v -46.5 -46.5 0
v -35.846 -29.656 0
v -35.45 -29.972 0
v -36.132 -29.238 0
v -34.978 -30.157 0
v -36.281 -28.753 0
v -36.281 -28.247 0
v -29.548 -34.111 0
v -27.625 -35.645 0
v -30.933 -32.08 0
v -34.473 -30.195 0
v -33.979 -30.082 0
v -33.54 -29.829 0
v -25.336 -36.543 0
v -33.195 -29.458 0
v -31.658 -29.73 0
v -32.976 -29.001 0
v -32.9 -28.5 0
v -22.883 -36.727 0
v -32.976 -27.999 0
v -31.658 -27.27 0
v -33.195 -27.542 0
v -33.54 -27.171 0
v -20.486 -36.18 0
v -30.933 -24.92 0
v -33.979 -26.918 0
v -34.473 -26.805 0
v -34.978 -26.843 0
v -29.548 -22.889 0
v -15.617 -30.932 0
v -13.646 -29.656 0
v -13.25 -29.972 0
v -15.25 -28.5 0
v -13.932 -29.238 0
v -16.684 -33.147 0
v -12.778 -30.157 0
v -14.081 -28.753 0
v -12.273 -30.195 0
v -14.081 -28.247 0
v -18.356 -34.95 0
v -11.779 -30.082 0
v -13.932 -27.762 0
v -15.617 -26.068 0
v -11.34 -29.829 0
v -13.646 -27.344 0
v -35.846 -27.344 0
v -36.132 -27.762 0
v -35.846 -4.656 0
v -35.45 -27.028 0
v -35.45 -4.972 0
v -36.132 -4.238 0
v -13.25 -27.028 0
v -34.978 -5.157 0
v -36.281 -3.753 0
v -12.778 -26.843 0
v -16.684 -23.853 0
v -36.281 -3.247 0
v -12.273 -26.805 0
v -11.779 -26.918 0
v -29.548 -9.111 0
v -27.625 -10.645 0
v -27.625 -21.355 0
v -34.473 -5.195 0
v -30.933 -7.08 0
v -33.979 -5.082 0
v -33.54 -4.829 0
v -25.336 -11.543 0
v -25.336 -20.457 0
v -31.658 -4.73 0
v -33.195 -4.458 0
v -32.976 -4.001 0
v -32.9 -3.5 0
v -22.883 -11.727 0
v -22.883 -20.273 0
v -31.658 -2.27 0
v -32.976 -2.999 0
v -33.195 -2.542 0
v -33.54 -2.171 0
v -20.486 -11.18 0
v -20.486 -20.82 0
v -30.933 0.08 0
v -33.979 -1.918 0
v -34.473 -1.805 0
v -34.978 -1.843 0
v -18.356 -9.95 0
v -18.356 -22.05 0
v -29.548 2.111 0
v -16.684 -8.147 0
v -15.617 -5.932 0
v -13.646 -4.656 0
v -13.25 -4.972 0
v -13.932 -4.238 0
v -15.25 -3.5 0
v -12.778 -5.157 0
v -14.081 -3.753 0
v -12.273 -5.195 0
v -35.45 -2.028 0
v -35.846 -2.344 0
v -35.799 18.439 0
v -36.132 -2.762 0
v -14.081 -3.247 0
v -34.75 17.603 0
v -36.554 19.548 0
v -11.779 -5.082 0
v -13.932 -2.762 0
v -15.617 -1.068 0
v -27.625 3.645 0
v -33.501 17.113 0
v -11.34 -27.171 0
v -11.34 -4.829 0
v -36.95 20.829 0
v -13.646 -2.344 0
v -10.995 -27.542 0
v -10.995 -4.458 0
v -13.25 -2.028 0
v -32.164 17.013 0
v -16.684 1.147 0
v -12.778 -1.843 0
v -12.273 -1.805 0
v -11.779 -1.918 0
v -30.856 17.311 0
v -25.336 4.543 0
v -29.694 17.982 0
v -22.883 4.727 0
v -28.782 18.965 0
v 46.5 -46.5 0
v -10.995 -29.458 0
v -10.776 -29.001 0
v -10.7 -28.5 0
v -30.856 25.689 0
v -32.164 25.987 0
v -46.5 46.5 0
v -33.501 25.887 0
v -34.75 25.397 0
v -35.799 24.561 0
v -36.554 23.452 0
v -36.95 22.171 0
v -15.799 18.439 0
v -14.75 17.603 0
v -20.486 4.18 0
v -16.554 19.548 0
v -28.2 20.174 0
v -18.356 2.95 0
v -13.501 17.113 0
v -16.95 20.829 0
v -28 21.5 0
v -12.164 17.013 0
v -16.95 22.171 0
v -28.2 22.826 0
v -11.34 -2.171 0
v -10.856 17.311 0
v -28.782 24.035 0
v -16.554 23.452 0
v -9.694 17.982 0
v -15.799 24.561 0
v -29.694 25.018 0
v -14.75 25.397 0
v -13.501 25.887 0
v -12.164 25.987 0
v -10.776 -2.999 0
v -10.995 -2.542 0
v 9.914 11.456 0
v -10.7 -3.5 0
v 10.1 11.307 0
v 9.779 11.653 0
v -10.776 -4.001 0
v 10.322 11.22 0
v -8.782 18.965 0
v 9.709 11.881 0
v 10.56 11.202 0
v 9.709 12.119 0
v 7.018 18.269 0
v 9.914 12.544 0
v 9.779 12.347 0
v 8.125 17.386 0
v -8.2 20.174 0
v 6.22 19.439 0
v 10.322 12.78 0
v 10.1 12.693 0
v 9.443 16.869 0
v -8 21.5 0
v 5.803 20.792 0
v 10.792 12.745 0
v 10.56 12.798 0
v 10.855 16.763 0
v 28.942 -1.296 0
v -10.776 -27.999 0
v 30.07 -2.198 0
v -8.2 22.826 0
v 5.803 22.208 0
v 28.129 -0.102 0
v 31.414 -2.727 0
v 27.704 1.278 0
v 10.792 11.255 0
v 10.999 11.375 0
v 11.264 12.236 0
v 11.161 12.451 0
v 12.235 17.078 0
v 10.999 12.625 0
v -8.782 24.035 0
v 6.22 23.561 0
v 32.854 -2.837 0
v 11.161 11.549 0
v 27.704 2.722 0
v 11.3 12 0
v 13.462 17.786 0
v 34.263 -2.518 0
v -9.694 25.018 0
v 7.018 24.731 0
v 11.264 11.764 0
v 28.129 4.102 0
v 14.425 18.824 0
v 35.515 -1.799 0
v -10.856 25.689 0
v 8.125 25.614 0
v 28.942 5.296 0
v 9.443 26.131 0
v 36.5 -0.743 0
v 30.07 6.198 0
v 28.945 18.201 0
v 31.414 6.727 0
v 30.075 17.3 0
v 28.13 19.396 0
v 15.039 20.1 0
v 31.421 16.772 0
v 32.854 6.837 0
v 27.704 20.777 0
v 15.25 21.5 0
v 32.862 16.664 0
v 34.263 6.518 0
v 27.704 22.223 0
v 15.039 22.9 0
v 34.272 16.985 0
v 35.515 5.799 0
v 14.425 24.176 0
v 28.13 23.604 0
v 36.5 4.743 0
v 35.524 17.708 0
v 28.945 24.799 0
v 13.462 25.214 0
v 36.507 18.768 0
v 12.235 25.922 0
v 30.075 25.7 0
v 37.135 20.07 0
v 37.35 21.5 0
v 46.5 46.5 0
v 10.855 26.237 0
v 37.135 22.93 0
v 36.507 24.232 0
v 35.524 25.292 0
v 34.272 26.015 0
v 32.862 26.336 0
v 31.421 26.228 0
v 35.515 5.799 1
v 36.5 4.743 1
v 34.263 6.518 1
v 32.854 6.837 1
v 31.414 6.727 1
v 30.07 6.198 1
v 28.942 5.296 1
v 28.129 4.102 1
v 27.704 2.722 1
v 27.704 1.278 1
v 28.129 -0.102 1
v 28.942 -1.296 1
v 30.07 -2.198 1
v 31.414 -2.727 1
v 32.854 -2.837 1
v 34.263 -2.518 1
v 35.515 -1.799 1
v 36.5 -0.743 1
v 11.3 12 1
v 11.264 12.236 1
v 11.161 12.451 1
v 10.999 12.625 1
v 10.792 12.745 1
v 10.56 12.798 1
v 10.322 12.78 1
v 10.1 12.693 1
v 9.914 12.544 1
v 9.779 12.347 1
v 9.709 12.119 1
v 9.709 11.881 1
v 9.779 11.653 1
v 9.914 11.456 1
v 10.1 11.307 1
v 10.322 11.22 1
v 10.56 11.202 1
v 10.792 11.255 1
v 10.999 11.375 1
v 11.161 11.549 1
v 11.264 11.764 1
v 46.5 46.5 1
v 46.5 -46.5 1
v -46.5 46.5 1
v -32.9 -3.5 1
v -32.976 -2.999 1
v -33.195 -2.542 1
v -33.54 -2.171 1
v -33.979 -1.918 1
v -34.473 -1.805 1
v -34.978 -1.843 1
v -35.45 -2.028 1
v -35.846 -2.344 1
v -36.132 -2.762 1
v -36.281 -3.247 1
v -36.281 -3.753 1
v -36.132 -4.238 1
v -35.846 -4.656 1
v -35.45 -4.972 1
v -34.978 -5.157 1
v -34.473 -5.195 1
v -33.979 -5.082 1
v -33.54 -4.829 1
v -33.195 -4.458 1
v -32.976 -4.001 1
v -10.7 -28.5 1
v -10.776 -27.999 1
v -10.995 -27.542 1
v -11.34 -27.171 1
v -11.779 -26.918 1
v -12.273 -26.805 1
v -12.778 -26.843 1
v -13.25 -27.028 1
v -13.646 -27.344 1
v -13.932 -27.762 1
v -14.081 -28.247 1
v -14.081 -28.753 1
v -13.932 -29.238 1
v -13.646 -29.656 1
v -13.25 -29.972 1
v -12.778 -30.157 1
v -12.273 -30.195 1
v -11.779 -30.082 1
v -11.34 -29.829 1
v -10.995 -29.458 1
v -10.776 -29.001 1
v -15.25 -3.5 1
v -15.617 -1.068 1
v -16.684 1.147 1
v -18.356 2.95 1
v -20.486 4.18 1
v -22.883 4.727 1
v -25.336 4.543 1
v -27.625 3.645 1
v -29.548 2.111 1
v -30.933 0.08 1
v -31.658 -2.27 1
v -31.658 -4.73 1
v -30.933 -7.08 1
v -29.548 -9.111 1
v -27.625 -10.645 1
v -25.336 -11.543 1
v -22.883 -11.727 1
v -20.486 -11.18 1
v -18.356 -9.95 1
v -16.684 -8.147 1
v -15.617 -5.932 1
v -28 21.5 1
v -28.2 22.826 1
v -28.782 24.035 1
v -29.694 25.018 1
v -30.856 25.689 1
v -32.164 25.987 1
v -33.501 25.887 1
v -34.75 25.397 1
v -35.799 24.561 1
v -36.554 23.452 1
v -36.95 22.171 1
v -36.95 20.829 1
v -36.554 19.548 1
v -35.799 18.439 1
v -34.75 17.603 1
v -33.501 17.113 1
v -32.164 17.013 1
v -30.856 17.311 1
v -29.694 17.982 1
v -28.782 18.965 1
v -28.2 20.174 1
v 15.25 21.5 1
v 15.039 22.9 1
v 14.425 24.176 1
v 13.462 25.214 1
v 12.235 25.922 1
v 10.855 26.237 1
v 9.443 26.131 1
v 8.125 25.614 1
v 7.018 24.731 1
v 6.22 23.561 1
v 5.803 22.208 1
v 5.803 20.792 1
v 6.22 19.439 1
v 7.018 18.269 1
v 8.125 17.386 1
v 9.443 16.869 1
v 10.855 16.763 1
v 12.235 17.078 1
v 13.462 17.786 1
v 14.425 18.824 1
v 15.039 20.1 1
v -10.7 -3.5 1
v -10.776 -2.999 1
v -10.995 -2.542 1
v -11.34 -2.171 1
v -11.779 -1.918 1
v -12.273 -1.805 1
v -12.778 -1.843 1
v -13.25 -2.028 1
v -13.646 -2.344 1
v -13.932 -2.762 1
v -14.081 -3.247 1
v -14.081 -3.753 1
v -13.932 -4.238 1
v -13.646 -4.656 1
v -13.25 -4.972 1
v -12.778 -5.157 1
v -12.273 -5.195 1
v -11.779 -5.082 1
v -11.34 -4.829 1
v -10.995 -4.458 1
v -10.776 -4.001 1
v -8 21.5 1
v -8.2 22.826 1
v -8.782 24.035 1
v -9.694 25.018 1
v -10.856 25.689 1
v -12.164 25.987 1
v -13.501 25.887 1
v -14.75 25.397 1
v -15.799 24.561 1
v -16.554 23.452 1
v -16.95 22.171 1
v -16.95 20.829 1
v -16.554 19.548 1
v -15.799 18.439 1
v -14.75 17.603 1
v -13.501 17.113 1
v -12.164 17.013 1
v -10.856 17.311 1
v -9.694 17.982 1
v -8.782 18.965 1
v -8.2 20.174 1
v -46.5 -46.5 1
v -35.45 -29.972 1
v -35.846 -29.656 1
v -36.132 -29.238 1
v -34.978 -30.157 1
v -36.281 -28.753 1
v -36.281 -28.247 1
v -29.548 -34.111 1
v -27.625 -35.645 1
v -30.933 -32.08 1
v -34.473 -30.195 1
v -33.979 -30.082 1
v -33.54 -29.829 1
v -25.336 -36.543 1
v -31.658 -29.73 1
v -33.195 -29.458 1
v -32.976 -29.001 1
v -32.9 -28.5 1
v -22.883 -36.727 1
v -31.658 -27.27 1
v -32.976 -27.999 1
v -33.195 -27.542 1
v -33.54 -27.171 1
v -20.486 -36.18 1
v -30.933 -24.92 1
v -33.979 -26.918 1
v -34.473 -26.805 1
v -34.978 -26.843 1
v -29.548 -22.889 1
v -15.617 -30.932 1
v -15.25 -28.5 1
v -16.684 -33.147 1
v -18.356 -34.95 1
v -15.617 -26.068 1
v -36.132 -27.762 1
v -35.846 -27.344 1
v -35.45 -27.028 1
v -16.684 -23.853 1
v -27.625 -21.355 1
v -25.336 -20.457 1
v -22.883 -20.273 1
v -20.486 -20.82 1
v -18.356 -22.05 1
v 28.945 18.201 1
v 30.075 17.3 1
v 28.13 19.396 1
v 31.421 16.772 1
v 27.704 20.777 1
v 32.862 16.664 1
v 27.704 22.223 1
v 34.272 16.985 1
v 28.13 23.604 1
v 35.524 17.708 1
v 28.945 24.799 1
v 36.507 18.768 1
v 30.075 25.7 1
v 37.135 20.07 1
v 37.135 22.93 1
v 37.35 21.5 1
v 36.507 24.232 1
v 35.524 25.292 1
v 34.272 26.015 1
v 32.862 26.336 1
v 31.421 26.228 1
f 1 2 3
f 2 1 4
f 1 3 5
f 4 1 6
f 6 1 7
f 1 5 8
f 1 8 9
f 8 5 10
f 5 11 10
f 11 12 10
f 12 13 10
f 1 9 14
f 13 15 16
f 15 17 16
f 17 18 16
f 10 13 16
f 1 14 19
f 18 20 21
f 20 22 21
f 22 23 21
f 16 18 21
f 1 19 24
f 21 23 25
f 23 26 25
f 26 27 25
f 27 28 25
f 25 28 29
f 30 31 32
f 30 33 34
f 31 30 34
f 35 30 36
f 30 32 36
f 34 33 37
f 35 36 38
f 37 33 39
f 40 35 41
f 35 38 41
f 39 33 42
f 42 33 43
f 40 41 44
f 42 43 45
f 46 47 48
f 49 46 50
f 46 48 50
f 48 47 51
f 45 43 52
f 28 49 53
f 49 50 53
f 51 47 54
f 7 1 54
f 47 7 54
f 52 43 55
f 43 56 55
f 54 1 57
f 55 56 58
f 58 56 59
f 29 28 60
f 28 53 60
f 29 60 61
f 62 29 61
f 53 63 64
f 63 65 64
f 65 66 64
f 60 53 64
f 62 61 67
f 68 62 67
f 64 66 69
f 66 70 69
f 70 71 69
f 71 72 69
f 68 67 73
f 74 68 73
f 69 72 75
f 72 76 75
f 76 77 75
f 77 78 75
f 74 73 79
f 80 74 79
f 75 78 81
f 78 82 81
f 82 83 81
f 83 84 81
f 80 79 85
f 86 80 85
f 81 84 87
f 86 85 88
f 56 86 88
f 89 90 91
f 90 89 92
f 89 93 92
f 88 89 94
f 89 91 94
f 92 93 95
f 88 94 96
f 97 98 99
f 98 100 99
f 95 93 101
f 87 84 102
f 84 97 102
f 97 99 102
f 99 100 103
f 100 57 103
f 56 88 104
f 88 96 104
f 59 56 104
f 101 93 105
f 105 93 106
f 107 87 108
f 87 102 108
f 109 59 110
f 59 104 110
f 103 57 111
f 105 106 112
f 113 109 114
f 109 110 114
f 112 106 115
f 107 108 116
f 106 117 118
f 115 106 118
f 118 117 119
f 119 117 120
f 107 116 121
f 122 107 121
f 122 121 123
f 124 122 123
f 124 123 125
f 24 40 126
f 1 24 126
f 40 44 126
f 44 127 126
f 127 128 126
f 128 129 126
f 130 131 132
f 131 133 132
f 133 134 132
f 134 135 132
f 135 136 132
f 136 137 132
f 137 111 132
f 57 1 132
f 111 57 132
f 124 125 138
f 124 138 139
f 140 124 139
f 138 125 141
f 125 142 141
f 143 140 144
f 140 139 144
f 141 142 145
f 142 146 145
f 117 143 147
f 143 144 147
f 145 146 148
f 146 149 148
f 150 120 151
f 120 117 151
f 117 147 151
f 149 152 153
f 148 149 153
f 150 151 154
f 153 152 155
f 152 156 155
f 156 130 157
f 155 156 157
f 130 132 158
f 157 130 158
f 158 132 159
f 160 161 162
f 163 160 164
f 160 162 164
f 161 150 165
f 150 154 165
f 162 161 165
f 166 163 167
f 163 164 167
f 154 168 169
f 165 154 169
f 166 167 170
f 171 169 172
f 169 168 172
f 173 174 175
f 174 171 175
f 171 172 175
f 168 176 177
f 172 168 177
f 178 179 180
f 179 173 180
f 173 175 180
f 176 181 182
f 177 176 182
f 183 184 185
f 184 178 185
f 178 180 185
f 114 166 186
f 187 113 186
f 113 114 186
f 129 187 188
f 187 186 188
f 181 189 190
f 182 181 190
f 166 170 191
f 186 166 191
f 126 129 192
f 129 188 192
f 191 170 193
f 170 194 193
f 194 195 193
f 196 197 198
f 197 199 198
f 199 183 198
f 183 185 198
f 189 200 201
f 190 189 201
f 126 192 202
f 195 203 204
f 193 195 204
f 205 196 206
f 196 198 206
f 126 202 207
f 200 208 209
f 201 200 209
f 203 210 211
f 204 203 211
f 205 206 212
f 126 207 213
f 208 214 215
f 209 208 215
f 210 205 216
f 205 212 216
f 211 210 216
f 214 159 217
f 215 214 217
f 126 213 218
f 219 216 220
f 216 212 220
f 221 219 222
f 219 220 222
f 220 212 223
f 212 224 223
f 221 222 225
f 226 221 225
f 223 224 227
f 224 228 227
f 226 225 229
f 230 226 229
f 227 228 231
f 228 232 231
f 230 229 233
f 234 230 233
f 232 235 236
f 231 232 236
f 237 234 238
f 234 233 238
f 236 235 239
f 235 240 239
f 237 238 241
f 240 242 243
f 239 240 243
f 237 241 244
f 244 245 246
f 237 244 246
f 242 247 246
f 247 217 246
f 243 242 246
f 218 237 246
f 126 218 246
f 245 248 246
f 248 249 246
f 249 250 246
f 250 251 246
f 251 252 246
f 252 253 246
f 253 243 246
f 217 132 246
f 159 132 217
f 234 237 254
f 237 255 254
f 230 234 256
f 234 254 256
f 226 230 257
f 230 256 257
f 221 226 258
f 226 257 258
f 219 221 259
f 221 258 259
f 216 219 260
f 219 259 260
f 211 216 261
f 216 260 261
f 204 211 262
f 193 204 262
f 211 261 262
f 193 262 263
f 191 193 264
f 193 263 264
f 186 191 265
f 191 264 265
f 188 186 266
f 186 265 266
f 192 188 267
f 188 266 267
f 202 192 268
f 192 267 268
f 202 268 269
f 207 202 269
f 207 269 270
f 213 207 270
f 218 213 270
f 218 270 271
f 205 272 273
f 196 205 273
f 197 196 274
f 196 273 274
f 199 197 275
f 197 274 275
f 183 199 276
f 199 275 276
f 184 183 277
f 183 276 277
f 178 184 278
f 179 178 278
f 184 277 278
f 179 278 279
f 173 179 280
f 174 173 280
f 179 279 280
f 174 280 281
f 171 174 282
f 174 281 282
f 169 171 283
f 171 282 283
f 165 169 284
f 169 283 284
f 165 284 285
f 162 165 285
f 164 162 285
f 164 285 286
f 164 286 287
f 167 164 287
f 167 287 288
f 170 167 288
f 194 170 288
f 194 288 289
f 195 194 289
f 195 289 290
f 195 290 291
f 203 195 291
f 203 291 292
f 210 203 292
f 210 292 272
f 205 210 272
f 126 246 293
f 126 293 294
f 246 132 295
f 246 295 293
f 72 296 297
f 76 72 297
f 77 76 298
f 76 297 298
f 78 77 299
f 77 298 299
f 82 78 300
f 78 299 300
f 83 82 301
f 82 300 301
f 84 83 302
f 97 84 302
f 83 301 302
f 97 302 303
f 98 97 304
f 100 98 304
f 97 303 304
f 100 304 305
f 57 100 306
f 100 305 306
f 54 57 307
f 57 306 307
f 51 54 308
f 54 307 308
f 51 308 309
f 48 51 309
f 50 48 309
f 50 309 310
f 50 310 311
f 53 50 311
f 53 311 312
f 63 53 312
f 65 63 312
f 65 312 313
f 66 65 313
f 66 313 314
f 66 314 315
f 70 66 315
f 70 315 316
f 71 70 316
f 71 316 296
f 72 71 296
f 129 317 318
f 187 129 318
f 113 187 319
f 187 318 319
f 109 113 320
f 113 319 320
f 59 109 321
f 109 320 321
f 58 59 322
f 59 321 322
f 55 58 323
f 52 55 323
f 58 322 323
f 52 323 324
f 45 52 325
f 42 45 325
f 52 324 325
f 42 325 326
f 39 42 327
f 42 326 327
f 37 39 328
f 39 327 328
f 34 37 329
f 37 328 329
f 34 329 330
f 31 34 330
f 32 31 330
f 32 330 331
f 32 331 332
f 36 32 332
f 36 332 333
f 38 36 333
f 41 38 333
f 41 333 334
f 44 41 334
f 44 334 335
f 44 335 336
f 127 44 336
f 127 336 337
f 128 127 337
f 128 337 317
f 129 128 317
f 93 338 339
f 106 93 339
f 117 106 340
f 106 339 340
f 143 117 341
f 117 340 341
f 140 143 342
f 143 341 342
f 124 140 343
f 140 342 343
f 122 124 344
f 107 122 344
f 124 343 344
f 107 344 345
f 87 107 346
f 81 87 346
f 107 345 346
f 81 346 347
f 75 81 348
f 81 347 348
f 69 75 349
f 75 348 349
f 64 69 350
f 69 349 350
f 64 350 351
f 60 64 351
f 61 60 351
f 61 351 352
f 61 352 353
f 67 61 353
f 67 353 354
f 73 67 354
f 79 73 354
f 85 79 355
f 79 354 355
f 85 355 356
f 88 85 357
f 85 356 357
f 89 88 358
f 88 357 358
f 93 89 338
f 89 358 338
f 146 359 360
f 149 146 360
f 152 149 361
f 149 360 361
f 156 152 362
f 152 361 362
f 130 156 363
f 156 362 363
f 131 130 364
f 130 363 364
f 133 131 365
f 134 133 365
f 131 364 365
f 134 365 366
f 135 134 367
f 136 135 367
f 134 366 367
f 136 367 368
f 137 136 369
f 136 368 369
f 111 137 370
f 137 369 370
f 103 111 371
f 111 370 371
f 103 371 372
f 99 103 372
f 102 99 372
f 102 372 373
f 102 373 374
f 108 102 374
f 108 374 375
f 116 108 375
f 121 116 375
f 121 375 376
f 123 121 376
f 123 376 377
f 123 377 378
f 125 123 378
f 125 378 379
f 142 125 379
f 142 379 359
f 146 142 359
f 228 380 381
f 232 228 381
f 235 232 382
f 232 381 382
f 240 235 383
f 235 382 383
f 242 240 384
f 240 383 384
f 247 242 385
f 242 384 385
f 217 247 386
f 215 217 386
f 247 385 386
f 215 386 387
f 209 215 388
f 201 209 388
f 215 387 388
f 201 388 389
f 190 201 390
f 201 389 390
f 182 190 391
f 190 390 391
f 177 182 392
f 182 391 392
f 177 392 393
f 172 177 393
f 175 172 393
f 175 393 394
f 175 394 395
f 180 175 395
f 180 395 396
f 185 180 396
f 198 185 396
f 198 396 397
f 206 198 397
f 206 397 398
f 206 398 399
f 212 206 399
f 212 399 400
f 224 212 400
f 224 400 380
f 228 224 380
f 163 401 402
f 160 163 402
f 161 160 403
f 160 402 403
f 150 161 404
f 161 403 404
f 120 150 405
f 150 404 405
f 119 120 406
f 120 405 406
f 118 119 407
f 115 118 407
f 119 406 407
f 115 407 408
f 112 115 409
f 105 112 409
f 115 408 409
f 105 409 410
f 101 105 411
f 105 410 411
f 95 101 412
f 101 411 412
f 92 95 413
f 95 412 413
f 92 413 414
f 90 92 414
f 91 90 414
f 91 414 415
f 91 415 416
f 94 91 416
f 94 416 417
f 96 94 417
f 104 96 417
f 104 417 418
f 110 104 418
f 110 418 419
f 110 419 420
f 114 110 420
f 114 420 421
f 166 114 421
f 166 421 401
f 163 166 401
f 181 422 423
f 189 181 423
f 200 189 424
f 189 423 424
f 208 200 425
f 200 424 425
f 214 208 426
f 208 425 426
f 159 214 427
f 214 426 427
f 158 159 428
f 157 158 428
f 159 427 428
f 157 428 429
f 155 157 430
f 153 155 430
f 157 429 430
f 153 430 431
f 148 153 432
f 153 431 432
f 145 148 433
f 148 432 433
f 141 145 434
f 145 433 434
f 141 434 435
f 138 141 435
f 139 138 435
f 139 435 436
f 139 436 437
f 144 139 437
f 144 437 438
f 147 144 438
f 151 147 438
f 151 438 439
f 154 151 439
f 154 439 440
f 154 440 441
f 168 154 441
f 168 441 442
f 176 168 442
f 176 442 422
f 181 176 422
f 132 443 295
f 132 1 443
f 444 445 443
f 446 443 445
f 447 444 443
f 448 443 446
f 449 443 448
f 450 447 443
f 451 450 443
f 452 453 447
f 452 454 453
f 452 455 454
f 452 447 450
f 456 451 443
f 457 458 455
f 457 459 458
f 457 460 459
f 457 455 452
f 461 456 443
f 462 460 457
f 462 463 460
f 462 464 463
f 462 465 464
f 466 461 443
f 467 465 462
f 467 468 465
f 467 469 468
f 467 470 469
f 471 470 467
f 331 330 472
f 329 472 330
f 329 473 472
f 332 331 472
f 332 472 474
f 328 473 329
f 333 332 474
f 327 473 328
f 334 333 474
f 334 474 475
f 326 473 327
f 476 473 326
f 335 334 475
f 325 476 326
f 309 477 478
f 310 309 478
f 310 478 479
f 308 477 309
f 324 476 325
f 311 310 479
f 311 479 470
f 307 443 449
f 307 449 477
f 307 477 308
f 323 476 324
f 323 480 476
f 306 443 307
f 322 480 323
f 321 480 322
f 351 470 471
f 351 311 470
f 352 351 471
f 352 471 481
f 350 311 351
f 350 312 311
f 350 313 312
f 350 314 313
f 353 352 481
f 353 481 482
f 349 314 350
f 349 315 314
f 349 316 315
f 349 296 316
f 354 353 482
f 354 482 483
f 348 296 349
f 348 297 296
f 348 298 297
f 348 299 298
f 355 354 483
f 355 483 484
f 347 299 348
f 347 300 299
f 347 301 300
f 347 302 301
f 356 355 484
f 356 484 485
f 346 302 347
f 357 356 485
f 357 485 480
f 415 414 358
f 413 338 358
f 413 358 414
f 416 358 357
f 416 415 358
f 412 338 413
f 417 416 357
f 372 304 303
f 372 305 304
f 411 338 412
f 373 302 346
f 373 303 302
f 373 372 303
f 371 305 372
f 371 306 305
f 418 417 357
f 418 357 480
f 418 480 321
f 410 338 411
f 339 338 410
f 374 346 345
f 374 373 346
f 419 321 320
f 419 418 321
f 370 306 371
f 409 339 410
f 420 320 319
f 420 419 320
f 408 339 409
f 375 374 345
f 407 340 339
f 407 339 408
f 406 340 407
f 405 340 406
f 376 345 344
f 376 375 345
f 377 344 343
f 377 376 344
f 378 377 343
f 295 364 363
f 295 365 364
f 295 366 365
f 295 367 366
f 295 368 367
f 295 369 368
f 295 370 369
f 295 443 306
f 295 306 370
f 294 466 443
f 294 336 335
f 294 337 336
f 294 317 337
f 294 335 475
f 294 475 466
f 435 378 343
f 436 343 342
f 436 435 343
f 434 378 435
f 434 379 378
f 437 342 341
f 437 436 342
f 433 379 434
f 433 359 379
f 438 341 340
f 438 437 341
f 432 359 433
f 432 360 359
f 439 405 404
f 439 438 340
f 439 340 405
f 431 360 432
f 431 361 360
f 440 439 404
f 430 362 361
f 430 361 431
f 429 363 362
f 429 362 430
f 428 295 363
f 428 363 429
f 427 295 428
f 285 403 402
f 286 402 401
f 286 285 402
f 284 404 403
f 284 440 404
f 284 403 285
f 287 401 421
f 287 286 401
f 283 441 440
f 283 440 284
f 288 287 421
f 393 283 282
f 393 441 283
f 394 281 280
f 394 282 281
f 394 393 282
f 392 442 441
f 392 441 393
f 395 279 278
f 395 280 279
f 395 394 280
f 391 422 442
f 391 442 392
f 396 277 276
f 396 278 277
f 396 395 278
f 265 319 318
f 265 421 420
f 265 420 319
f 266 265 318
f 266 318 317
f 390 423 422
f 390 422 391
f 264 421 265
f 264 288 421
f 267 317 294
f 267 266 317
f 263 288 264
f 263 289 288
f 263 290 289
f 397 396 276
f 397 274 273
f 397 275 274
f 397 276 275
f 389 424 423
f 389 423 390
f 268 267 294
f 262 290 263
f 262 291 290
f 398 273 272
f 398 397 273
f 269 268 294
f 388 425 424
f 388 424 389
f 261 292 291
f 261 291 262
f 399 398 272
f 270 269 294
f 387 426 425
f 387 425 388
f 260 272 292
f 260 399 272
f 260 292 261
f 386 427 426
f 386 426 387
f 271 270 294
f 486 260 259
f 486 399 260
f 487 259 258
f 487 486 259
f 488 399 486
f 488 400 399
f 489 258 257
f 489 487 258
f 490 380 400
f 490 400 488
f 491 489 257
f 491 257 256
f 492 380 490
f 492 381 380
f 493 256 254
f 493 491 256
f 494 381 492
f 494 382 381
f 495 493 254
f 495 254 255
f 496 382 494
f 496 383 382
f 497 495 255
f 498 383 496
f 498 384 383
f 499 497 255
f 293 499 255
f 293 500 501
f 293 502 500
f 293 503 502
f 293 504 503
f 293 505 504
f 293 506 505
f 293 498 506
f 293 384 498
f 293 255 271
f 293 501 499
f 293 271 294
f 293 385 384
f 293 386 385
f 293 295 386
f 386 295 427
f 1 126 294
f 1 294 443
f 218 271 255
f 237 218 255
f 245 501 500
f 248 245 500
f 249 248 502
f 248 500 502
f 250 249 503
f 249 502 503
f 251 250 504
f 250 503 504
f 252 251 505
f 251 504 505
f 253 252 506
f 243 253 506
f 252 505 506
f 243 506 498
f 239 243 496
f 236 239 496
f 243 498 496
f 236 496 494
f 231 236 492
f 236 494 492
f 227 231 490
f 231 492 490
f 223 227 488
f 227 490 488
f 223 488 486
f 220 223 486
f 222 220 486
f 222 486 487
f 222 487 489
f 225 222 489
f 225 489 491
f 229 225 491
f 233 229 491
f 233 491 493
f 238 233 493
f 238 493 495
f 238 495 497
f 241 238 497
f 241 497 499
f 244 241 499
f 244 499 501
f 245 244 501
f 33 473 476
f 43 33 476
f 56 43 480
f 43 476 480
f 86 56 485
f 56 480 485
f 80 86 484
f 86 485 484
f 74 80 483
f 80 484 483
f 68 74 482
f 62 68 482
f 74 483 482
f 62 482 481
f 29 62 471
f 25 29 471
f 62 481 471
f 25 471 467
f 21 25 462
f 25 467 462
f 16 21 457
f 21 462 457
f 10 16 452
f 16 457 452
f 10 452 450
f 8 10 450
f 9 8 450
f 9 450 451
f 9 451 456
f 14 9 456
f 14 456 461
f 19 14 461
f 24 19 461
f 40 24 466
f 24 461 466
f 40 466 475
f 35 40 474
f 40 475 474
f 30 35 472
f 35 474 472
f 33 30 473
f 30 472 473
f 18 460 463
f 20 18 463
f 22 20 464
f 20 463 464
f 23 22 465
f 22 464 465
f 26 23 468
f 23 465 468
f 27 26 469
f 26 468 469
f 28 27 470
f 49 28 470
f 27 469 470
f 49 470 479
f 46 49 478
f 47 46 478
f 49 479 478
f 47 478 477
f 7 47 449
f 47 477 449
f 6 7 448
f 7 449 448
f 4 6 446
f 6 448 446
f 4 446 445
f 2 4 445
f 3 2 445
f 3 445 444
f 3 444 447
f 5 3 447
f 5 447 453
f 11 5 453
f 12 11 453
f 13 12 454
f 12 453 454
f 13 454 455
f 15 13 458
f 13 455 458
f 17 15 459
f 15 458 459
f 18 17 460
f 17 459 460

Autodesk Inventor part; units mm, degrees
ref_plane "YZ Plane" through (0, 0, 0) normal (1, 0, 0) x (0, 1, 0)
ref_plane "XZ Plane" through (0, 0, 0) normal (0, 1, 0) x (-1, 0, 0)
ref_plane "XY Plane" through (0, 0, 0) normal (0, 0, 1) x (1, 0, 0)
sketch "Sketch1" plane through (0, 0, 0) normal (0, 0, 1) x (1, 0, 0)
  line L0 (0, 46.5) -> (46.5, 46.5)
  line L1 (46.5, 46.5) -> (46.5, 0)
  line L2 (46.5, 0) -> (46.5, -46.5)
  line L3 (46.5, -46.5) -> (0, -46.5)
  line L4 (0, -46.5) -> (-46.5, -46.5)
  line L5 (-46.5, -46.5) -> (-46.5, 0)
  line L6 (-46.5, 0) -> (-46.5, 46.5)
  line L7 (-46.5, 46.5) -> (0, 46.5)
  point P0 (0, 0)
  dimension "d82" = 46.5
  dimension "d83" = 46.5
  dimension "d84" = 93
  dimension "d85" = 93
extrude "Plate" add sketch "Sketch1" along normal blind 1
sketch "Sketch2" plane through (0, 0, 1) normal (0, 0, 1) x (1, 0, 0)
  circle A0 centre (-23.5, -28.5) radius 8.25
  circle A1 centre (-12.4, -28.5) radius 1.7
  circle A2 centre (-34.6, -28.5) radius 1.7
  line L0 (-46.5, 46.5) -> (-46.5, -46.5) projected
  line L1 (-46.5, -46.5) -> (46.5, -46.5) projected
  point P0 (0, 0)
  dimension "d6" = 16.5
  dimension "d8" = 3.4
  dimension "d29" = 11.1
  dimension "d30" = 11.1
  dimension "d93" = 23
  dimension "d94" = 18
extrude "DIN hole" cut sketch "Sketch2" against normal through all
pattern_linear "Rectangular Pattern1" count 2 spacing 25 along (0, 1, 0) of "DIN hole"
sketch "Sketch4" plane through (0, 0, 1) normal (0, 0, 1) x (1, 0, 0)
  circle A0 centre (-23.5, -28.5) radius 8.25 projected
  point P0 (0, 0)
sketch "Sketch5" plane through (0, 0, 1) normal (0, 0, 1) x (1, 0, 0)
  line L0 (46.5, 46.5) -> (-46.5, 46.5) projected
  line L1 (-46.5, 46.5) -> (-46.5, -46.5) projected
  circle A0 centre (-32.5, 21.5) radius 4.5
  point P0 (0, 0)
  dimension "d90" = 9
  dimension "d91" = 14
  dimension "d92" = 25
extrude "LED" cut sketch "Sketch5" along normal through all both and the other way through all
pattern_linear "Rectangular Pattern3" count 2 spacing 20 along (1, 0, 0) of "LED"
sketch "Sketch6" plane through (0, 0, 1) normal (0, 0, 1) x (1, 0, 0)
  circle A0 centre (32.5, 21.5) radius 4.85
  point P0 (-26.5, 37.5)
  point P1 (0, 0)
  dimension "d61" = 9.7
extrude "BNCs" cut sketch "Sketch6" along normal through all both and the other way through all
sketch "Sketch7" plane through (0, 0, 1) normal (0, 0, 1) x (1, 0, 0)
  circle A0 centre (32.5, 21.5) radius 4.85 projected
  circle A1 centre (10.5, 21.5) radius 4.75
  circle A2 centre (10.5, 12) radius 0.8
  point P0 (0, 0)
  dimension "d70" = 9.5
  dimension "d71" = 1.6
  dimension "d72" = 9.5
  dimension "d73" = 22
extrude "Extrusion9" cut sketch "Sketch7" against normal blind 1 contours A1 | A2
sketch "Sketch8" plane through (0, 0, 1) normal (0, 0, 1) x (1, 0, 0)
  arc A0 (36.5, 4.7427) -> (36.5, -0.7427) centre (32.5, 2) ccw
  line L0 (36.5, 2) -> (36.5, -0.7427)
  line L1 (36.5, 2) -> (36.5, 4.7427)
  point P0 (0, 0)
extrude "Extrusion10" cut sketch "Sketch8" against normal blind 10
properties part number "AmplifierPowerSupplyNew"
